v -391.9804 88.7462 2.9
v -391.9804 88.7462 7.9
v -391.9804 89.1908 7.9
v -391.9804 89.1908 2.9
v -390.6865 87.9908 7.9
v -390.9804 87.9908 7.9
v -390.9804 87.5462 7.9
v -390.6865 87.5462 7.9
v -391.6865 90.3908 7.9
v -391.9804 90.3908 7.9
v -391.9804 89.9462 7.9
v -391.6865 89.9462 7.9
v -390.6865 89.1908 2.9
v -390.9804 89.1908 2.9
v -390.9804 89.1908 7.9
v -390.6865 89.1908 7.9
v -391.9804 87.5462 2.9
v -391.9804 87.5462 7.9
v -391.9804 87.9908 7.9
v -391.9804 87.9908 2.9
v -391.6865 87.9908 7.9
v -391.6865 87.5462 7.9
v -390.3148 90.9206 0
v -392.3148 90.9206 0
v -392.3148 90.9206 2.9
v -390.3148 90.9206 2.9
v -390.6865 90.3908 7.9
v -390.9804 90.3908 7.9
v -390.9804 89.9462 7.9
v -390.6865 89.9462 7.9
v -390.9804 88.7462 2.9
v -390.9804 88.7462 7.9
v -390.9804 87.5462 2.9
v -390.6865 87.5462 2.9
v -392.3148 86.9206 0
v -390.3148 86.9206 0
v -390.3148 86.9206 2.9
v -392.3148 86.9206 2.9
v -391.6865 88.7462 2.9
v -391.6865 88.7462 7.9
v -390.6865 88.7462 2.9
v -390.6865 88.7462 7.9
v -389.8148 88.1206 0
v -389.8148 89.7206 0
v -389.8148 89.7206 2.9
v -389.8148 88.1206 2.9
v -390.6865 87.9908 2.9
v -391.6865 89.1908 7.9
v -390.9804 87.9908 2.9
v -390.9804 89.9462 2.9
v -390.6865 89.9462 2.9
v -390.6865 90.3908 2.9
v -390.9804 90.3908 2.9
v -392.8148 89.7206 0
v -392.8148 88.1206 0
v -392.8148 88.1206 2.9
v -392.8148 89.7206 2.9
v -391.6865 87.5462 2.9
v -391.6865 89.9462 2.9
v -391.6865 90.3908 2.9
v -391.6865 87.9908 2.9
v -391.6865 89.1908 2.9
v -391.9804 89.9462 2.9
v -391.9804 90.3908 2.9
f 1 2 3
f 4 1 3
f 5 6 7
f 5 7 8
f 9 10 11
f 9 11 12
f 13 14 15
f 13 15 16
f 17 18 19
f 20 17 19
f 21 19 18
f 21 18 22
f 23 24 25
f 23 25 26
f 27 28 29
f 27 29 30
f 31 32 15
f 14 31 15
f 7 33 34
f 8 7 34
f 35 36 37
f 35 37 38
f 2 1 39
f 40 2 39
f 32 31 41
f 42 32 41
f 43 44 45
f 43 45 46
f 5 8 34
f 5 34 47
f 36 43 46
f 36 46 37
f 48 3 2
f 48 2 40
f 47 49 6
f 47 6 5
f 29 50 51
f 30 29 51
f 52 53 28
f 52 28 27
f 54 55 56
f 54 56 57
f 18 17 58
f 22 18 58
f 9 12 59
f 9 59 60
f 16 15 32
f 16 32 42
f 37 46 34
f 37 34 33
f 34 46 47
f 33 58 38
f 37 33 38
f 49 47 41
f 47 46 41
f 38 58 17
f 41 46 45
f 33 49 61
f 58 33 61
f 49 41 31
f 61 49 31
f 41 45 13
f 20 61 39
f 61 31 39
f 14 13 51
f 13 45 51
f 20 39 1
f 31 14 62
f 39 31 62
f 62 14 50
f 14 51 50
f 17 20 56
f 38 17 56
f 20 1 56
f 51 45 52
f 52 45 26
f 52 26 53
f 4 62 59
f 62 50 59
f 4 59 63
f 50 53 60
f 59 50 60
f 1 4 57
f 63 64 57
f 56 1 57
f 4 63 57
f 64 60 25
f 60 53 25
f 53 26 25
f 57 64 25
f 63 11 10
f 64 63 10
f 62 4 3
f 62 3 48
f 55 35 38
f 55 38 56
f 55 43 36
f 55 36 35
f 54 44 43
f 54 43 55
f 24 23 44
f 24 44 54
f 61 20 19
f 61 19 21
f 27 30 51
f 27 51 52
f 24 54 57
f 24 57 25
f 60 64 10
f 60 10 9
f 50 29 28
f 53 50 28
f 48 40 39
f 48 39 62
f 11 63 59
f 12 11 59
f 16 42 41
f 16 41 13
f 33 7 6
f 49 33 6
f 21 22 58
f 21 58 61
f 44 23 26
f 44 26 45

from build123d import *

# Parameters (mm, degrees)
EXTRUDE_1_DEPTH = 2.9
SKETCH_2_W      = 0.293894488
SKETCH_2_H      = 0.44460961
EXTRUDE_2_DEPTH = 5


with BuildPart() as part:
    # Эскиз1 → Бобышка-Вытянуть1 (new body)
    with BuildSketch(Plane.XY):
        Polygon((-392.814753218, 89.720587497), (-392.314753218, 90.920587497), (-390.314753218, 90.920587497), (-389.814753218, 89.720587497), (-389.814753218, 88.120587497), (-390.314753218, 86.920587497), (-392.314753218, 86.920587497), (-392.814753218, 88.120587497), align=None)
    extrude(amount=EXTRUDE_1_DEPTH)

    # Эскиз2 → Бобышка-Вытянуть2 (add)
    with BuildSketch(Plane.XY.offset(2.9)):
        with Locations((-390.83341038, 90.168528042)):
            Rectangle(SKETCH_2_W, SKETCH_2_H)
        with Locations((-391.83341038, 90.168528042)):
            Rectangle(SKETCH_2_W, SKETCH_2_H)
        with Locations((-390.83341038, 88.968528042)):
            Rectangle(SKETCH_2_W, SKETCH_2_H)
        with Locations((-390.83341038, 87.768528042)):
            Rectangle(SKETCH_2_W, SKETCH_2_H)
        with Locations((-391.83341038, 88.968528042)):
            Rectangle(SKETCH_2_W, SKETCH_2_H)
        with Locations((-391.83341038, 87.768528042)):
            Rectangle(SKETCH_2_W, SKETCH_2_H)
    extrude(amount=EXTRUDE_2_DEPTH)


solid = part.part
